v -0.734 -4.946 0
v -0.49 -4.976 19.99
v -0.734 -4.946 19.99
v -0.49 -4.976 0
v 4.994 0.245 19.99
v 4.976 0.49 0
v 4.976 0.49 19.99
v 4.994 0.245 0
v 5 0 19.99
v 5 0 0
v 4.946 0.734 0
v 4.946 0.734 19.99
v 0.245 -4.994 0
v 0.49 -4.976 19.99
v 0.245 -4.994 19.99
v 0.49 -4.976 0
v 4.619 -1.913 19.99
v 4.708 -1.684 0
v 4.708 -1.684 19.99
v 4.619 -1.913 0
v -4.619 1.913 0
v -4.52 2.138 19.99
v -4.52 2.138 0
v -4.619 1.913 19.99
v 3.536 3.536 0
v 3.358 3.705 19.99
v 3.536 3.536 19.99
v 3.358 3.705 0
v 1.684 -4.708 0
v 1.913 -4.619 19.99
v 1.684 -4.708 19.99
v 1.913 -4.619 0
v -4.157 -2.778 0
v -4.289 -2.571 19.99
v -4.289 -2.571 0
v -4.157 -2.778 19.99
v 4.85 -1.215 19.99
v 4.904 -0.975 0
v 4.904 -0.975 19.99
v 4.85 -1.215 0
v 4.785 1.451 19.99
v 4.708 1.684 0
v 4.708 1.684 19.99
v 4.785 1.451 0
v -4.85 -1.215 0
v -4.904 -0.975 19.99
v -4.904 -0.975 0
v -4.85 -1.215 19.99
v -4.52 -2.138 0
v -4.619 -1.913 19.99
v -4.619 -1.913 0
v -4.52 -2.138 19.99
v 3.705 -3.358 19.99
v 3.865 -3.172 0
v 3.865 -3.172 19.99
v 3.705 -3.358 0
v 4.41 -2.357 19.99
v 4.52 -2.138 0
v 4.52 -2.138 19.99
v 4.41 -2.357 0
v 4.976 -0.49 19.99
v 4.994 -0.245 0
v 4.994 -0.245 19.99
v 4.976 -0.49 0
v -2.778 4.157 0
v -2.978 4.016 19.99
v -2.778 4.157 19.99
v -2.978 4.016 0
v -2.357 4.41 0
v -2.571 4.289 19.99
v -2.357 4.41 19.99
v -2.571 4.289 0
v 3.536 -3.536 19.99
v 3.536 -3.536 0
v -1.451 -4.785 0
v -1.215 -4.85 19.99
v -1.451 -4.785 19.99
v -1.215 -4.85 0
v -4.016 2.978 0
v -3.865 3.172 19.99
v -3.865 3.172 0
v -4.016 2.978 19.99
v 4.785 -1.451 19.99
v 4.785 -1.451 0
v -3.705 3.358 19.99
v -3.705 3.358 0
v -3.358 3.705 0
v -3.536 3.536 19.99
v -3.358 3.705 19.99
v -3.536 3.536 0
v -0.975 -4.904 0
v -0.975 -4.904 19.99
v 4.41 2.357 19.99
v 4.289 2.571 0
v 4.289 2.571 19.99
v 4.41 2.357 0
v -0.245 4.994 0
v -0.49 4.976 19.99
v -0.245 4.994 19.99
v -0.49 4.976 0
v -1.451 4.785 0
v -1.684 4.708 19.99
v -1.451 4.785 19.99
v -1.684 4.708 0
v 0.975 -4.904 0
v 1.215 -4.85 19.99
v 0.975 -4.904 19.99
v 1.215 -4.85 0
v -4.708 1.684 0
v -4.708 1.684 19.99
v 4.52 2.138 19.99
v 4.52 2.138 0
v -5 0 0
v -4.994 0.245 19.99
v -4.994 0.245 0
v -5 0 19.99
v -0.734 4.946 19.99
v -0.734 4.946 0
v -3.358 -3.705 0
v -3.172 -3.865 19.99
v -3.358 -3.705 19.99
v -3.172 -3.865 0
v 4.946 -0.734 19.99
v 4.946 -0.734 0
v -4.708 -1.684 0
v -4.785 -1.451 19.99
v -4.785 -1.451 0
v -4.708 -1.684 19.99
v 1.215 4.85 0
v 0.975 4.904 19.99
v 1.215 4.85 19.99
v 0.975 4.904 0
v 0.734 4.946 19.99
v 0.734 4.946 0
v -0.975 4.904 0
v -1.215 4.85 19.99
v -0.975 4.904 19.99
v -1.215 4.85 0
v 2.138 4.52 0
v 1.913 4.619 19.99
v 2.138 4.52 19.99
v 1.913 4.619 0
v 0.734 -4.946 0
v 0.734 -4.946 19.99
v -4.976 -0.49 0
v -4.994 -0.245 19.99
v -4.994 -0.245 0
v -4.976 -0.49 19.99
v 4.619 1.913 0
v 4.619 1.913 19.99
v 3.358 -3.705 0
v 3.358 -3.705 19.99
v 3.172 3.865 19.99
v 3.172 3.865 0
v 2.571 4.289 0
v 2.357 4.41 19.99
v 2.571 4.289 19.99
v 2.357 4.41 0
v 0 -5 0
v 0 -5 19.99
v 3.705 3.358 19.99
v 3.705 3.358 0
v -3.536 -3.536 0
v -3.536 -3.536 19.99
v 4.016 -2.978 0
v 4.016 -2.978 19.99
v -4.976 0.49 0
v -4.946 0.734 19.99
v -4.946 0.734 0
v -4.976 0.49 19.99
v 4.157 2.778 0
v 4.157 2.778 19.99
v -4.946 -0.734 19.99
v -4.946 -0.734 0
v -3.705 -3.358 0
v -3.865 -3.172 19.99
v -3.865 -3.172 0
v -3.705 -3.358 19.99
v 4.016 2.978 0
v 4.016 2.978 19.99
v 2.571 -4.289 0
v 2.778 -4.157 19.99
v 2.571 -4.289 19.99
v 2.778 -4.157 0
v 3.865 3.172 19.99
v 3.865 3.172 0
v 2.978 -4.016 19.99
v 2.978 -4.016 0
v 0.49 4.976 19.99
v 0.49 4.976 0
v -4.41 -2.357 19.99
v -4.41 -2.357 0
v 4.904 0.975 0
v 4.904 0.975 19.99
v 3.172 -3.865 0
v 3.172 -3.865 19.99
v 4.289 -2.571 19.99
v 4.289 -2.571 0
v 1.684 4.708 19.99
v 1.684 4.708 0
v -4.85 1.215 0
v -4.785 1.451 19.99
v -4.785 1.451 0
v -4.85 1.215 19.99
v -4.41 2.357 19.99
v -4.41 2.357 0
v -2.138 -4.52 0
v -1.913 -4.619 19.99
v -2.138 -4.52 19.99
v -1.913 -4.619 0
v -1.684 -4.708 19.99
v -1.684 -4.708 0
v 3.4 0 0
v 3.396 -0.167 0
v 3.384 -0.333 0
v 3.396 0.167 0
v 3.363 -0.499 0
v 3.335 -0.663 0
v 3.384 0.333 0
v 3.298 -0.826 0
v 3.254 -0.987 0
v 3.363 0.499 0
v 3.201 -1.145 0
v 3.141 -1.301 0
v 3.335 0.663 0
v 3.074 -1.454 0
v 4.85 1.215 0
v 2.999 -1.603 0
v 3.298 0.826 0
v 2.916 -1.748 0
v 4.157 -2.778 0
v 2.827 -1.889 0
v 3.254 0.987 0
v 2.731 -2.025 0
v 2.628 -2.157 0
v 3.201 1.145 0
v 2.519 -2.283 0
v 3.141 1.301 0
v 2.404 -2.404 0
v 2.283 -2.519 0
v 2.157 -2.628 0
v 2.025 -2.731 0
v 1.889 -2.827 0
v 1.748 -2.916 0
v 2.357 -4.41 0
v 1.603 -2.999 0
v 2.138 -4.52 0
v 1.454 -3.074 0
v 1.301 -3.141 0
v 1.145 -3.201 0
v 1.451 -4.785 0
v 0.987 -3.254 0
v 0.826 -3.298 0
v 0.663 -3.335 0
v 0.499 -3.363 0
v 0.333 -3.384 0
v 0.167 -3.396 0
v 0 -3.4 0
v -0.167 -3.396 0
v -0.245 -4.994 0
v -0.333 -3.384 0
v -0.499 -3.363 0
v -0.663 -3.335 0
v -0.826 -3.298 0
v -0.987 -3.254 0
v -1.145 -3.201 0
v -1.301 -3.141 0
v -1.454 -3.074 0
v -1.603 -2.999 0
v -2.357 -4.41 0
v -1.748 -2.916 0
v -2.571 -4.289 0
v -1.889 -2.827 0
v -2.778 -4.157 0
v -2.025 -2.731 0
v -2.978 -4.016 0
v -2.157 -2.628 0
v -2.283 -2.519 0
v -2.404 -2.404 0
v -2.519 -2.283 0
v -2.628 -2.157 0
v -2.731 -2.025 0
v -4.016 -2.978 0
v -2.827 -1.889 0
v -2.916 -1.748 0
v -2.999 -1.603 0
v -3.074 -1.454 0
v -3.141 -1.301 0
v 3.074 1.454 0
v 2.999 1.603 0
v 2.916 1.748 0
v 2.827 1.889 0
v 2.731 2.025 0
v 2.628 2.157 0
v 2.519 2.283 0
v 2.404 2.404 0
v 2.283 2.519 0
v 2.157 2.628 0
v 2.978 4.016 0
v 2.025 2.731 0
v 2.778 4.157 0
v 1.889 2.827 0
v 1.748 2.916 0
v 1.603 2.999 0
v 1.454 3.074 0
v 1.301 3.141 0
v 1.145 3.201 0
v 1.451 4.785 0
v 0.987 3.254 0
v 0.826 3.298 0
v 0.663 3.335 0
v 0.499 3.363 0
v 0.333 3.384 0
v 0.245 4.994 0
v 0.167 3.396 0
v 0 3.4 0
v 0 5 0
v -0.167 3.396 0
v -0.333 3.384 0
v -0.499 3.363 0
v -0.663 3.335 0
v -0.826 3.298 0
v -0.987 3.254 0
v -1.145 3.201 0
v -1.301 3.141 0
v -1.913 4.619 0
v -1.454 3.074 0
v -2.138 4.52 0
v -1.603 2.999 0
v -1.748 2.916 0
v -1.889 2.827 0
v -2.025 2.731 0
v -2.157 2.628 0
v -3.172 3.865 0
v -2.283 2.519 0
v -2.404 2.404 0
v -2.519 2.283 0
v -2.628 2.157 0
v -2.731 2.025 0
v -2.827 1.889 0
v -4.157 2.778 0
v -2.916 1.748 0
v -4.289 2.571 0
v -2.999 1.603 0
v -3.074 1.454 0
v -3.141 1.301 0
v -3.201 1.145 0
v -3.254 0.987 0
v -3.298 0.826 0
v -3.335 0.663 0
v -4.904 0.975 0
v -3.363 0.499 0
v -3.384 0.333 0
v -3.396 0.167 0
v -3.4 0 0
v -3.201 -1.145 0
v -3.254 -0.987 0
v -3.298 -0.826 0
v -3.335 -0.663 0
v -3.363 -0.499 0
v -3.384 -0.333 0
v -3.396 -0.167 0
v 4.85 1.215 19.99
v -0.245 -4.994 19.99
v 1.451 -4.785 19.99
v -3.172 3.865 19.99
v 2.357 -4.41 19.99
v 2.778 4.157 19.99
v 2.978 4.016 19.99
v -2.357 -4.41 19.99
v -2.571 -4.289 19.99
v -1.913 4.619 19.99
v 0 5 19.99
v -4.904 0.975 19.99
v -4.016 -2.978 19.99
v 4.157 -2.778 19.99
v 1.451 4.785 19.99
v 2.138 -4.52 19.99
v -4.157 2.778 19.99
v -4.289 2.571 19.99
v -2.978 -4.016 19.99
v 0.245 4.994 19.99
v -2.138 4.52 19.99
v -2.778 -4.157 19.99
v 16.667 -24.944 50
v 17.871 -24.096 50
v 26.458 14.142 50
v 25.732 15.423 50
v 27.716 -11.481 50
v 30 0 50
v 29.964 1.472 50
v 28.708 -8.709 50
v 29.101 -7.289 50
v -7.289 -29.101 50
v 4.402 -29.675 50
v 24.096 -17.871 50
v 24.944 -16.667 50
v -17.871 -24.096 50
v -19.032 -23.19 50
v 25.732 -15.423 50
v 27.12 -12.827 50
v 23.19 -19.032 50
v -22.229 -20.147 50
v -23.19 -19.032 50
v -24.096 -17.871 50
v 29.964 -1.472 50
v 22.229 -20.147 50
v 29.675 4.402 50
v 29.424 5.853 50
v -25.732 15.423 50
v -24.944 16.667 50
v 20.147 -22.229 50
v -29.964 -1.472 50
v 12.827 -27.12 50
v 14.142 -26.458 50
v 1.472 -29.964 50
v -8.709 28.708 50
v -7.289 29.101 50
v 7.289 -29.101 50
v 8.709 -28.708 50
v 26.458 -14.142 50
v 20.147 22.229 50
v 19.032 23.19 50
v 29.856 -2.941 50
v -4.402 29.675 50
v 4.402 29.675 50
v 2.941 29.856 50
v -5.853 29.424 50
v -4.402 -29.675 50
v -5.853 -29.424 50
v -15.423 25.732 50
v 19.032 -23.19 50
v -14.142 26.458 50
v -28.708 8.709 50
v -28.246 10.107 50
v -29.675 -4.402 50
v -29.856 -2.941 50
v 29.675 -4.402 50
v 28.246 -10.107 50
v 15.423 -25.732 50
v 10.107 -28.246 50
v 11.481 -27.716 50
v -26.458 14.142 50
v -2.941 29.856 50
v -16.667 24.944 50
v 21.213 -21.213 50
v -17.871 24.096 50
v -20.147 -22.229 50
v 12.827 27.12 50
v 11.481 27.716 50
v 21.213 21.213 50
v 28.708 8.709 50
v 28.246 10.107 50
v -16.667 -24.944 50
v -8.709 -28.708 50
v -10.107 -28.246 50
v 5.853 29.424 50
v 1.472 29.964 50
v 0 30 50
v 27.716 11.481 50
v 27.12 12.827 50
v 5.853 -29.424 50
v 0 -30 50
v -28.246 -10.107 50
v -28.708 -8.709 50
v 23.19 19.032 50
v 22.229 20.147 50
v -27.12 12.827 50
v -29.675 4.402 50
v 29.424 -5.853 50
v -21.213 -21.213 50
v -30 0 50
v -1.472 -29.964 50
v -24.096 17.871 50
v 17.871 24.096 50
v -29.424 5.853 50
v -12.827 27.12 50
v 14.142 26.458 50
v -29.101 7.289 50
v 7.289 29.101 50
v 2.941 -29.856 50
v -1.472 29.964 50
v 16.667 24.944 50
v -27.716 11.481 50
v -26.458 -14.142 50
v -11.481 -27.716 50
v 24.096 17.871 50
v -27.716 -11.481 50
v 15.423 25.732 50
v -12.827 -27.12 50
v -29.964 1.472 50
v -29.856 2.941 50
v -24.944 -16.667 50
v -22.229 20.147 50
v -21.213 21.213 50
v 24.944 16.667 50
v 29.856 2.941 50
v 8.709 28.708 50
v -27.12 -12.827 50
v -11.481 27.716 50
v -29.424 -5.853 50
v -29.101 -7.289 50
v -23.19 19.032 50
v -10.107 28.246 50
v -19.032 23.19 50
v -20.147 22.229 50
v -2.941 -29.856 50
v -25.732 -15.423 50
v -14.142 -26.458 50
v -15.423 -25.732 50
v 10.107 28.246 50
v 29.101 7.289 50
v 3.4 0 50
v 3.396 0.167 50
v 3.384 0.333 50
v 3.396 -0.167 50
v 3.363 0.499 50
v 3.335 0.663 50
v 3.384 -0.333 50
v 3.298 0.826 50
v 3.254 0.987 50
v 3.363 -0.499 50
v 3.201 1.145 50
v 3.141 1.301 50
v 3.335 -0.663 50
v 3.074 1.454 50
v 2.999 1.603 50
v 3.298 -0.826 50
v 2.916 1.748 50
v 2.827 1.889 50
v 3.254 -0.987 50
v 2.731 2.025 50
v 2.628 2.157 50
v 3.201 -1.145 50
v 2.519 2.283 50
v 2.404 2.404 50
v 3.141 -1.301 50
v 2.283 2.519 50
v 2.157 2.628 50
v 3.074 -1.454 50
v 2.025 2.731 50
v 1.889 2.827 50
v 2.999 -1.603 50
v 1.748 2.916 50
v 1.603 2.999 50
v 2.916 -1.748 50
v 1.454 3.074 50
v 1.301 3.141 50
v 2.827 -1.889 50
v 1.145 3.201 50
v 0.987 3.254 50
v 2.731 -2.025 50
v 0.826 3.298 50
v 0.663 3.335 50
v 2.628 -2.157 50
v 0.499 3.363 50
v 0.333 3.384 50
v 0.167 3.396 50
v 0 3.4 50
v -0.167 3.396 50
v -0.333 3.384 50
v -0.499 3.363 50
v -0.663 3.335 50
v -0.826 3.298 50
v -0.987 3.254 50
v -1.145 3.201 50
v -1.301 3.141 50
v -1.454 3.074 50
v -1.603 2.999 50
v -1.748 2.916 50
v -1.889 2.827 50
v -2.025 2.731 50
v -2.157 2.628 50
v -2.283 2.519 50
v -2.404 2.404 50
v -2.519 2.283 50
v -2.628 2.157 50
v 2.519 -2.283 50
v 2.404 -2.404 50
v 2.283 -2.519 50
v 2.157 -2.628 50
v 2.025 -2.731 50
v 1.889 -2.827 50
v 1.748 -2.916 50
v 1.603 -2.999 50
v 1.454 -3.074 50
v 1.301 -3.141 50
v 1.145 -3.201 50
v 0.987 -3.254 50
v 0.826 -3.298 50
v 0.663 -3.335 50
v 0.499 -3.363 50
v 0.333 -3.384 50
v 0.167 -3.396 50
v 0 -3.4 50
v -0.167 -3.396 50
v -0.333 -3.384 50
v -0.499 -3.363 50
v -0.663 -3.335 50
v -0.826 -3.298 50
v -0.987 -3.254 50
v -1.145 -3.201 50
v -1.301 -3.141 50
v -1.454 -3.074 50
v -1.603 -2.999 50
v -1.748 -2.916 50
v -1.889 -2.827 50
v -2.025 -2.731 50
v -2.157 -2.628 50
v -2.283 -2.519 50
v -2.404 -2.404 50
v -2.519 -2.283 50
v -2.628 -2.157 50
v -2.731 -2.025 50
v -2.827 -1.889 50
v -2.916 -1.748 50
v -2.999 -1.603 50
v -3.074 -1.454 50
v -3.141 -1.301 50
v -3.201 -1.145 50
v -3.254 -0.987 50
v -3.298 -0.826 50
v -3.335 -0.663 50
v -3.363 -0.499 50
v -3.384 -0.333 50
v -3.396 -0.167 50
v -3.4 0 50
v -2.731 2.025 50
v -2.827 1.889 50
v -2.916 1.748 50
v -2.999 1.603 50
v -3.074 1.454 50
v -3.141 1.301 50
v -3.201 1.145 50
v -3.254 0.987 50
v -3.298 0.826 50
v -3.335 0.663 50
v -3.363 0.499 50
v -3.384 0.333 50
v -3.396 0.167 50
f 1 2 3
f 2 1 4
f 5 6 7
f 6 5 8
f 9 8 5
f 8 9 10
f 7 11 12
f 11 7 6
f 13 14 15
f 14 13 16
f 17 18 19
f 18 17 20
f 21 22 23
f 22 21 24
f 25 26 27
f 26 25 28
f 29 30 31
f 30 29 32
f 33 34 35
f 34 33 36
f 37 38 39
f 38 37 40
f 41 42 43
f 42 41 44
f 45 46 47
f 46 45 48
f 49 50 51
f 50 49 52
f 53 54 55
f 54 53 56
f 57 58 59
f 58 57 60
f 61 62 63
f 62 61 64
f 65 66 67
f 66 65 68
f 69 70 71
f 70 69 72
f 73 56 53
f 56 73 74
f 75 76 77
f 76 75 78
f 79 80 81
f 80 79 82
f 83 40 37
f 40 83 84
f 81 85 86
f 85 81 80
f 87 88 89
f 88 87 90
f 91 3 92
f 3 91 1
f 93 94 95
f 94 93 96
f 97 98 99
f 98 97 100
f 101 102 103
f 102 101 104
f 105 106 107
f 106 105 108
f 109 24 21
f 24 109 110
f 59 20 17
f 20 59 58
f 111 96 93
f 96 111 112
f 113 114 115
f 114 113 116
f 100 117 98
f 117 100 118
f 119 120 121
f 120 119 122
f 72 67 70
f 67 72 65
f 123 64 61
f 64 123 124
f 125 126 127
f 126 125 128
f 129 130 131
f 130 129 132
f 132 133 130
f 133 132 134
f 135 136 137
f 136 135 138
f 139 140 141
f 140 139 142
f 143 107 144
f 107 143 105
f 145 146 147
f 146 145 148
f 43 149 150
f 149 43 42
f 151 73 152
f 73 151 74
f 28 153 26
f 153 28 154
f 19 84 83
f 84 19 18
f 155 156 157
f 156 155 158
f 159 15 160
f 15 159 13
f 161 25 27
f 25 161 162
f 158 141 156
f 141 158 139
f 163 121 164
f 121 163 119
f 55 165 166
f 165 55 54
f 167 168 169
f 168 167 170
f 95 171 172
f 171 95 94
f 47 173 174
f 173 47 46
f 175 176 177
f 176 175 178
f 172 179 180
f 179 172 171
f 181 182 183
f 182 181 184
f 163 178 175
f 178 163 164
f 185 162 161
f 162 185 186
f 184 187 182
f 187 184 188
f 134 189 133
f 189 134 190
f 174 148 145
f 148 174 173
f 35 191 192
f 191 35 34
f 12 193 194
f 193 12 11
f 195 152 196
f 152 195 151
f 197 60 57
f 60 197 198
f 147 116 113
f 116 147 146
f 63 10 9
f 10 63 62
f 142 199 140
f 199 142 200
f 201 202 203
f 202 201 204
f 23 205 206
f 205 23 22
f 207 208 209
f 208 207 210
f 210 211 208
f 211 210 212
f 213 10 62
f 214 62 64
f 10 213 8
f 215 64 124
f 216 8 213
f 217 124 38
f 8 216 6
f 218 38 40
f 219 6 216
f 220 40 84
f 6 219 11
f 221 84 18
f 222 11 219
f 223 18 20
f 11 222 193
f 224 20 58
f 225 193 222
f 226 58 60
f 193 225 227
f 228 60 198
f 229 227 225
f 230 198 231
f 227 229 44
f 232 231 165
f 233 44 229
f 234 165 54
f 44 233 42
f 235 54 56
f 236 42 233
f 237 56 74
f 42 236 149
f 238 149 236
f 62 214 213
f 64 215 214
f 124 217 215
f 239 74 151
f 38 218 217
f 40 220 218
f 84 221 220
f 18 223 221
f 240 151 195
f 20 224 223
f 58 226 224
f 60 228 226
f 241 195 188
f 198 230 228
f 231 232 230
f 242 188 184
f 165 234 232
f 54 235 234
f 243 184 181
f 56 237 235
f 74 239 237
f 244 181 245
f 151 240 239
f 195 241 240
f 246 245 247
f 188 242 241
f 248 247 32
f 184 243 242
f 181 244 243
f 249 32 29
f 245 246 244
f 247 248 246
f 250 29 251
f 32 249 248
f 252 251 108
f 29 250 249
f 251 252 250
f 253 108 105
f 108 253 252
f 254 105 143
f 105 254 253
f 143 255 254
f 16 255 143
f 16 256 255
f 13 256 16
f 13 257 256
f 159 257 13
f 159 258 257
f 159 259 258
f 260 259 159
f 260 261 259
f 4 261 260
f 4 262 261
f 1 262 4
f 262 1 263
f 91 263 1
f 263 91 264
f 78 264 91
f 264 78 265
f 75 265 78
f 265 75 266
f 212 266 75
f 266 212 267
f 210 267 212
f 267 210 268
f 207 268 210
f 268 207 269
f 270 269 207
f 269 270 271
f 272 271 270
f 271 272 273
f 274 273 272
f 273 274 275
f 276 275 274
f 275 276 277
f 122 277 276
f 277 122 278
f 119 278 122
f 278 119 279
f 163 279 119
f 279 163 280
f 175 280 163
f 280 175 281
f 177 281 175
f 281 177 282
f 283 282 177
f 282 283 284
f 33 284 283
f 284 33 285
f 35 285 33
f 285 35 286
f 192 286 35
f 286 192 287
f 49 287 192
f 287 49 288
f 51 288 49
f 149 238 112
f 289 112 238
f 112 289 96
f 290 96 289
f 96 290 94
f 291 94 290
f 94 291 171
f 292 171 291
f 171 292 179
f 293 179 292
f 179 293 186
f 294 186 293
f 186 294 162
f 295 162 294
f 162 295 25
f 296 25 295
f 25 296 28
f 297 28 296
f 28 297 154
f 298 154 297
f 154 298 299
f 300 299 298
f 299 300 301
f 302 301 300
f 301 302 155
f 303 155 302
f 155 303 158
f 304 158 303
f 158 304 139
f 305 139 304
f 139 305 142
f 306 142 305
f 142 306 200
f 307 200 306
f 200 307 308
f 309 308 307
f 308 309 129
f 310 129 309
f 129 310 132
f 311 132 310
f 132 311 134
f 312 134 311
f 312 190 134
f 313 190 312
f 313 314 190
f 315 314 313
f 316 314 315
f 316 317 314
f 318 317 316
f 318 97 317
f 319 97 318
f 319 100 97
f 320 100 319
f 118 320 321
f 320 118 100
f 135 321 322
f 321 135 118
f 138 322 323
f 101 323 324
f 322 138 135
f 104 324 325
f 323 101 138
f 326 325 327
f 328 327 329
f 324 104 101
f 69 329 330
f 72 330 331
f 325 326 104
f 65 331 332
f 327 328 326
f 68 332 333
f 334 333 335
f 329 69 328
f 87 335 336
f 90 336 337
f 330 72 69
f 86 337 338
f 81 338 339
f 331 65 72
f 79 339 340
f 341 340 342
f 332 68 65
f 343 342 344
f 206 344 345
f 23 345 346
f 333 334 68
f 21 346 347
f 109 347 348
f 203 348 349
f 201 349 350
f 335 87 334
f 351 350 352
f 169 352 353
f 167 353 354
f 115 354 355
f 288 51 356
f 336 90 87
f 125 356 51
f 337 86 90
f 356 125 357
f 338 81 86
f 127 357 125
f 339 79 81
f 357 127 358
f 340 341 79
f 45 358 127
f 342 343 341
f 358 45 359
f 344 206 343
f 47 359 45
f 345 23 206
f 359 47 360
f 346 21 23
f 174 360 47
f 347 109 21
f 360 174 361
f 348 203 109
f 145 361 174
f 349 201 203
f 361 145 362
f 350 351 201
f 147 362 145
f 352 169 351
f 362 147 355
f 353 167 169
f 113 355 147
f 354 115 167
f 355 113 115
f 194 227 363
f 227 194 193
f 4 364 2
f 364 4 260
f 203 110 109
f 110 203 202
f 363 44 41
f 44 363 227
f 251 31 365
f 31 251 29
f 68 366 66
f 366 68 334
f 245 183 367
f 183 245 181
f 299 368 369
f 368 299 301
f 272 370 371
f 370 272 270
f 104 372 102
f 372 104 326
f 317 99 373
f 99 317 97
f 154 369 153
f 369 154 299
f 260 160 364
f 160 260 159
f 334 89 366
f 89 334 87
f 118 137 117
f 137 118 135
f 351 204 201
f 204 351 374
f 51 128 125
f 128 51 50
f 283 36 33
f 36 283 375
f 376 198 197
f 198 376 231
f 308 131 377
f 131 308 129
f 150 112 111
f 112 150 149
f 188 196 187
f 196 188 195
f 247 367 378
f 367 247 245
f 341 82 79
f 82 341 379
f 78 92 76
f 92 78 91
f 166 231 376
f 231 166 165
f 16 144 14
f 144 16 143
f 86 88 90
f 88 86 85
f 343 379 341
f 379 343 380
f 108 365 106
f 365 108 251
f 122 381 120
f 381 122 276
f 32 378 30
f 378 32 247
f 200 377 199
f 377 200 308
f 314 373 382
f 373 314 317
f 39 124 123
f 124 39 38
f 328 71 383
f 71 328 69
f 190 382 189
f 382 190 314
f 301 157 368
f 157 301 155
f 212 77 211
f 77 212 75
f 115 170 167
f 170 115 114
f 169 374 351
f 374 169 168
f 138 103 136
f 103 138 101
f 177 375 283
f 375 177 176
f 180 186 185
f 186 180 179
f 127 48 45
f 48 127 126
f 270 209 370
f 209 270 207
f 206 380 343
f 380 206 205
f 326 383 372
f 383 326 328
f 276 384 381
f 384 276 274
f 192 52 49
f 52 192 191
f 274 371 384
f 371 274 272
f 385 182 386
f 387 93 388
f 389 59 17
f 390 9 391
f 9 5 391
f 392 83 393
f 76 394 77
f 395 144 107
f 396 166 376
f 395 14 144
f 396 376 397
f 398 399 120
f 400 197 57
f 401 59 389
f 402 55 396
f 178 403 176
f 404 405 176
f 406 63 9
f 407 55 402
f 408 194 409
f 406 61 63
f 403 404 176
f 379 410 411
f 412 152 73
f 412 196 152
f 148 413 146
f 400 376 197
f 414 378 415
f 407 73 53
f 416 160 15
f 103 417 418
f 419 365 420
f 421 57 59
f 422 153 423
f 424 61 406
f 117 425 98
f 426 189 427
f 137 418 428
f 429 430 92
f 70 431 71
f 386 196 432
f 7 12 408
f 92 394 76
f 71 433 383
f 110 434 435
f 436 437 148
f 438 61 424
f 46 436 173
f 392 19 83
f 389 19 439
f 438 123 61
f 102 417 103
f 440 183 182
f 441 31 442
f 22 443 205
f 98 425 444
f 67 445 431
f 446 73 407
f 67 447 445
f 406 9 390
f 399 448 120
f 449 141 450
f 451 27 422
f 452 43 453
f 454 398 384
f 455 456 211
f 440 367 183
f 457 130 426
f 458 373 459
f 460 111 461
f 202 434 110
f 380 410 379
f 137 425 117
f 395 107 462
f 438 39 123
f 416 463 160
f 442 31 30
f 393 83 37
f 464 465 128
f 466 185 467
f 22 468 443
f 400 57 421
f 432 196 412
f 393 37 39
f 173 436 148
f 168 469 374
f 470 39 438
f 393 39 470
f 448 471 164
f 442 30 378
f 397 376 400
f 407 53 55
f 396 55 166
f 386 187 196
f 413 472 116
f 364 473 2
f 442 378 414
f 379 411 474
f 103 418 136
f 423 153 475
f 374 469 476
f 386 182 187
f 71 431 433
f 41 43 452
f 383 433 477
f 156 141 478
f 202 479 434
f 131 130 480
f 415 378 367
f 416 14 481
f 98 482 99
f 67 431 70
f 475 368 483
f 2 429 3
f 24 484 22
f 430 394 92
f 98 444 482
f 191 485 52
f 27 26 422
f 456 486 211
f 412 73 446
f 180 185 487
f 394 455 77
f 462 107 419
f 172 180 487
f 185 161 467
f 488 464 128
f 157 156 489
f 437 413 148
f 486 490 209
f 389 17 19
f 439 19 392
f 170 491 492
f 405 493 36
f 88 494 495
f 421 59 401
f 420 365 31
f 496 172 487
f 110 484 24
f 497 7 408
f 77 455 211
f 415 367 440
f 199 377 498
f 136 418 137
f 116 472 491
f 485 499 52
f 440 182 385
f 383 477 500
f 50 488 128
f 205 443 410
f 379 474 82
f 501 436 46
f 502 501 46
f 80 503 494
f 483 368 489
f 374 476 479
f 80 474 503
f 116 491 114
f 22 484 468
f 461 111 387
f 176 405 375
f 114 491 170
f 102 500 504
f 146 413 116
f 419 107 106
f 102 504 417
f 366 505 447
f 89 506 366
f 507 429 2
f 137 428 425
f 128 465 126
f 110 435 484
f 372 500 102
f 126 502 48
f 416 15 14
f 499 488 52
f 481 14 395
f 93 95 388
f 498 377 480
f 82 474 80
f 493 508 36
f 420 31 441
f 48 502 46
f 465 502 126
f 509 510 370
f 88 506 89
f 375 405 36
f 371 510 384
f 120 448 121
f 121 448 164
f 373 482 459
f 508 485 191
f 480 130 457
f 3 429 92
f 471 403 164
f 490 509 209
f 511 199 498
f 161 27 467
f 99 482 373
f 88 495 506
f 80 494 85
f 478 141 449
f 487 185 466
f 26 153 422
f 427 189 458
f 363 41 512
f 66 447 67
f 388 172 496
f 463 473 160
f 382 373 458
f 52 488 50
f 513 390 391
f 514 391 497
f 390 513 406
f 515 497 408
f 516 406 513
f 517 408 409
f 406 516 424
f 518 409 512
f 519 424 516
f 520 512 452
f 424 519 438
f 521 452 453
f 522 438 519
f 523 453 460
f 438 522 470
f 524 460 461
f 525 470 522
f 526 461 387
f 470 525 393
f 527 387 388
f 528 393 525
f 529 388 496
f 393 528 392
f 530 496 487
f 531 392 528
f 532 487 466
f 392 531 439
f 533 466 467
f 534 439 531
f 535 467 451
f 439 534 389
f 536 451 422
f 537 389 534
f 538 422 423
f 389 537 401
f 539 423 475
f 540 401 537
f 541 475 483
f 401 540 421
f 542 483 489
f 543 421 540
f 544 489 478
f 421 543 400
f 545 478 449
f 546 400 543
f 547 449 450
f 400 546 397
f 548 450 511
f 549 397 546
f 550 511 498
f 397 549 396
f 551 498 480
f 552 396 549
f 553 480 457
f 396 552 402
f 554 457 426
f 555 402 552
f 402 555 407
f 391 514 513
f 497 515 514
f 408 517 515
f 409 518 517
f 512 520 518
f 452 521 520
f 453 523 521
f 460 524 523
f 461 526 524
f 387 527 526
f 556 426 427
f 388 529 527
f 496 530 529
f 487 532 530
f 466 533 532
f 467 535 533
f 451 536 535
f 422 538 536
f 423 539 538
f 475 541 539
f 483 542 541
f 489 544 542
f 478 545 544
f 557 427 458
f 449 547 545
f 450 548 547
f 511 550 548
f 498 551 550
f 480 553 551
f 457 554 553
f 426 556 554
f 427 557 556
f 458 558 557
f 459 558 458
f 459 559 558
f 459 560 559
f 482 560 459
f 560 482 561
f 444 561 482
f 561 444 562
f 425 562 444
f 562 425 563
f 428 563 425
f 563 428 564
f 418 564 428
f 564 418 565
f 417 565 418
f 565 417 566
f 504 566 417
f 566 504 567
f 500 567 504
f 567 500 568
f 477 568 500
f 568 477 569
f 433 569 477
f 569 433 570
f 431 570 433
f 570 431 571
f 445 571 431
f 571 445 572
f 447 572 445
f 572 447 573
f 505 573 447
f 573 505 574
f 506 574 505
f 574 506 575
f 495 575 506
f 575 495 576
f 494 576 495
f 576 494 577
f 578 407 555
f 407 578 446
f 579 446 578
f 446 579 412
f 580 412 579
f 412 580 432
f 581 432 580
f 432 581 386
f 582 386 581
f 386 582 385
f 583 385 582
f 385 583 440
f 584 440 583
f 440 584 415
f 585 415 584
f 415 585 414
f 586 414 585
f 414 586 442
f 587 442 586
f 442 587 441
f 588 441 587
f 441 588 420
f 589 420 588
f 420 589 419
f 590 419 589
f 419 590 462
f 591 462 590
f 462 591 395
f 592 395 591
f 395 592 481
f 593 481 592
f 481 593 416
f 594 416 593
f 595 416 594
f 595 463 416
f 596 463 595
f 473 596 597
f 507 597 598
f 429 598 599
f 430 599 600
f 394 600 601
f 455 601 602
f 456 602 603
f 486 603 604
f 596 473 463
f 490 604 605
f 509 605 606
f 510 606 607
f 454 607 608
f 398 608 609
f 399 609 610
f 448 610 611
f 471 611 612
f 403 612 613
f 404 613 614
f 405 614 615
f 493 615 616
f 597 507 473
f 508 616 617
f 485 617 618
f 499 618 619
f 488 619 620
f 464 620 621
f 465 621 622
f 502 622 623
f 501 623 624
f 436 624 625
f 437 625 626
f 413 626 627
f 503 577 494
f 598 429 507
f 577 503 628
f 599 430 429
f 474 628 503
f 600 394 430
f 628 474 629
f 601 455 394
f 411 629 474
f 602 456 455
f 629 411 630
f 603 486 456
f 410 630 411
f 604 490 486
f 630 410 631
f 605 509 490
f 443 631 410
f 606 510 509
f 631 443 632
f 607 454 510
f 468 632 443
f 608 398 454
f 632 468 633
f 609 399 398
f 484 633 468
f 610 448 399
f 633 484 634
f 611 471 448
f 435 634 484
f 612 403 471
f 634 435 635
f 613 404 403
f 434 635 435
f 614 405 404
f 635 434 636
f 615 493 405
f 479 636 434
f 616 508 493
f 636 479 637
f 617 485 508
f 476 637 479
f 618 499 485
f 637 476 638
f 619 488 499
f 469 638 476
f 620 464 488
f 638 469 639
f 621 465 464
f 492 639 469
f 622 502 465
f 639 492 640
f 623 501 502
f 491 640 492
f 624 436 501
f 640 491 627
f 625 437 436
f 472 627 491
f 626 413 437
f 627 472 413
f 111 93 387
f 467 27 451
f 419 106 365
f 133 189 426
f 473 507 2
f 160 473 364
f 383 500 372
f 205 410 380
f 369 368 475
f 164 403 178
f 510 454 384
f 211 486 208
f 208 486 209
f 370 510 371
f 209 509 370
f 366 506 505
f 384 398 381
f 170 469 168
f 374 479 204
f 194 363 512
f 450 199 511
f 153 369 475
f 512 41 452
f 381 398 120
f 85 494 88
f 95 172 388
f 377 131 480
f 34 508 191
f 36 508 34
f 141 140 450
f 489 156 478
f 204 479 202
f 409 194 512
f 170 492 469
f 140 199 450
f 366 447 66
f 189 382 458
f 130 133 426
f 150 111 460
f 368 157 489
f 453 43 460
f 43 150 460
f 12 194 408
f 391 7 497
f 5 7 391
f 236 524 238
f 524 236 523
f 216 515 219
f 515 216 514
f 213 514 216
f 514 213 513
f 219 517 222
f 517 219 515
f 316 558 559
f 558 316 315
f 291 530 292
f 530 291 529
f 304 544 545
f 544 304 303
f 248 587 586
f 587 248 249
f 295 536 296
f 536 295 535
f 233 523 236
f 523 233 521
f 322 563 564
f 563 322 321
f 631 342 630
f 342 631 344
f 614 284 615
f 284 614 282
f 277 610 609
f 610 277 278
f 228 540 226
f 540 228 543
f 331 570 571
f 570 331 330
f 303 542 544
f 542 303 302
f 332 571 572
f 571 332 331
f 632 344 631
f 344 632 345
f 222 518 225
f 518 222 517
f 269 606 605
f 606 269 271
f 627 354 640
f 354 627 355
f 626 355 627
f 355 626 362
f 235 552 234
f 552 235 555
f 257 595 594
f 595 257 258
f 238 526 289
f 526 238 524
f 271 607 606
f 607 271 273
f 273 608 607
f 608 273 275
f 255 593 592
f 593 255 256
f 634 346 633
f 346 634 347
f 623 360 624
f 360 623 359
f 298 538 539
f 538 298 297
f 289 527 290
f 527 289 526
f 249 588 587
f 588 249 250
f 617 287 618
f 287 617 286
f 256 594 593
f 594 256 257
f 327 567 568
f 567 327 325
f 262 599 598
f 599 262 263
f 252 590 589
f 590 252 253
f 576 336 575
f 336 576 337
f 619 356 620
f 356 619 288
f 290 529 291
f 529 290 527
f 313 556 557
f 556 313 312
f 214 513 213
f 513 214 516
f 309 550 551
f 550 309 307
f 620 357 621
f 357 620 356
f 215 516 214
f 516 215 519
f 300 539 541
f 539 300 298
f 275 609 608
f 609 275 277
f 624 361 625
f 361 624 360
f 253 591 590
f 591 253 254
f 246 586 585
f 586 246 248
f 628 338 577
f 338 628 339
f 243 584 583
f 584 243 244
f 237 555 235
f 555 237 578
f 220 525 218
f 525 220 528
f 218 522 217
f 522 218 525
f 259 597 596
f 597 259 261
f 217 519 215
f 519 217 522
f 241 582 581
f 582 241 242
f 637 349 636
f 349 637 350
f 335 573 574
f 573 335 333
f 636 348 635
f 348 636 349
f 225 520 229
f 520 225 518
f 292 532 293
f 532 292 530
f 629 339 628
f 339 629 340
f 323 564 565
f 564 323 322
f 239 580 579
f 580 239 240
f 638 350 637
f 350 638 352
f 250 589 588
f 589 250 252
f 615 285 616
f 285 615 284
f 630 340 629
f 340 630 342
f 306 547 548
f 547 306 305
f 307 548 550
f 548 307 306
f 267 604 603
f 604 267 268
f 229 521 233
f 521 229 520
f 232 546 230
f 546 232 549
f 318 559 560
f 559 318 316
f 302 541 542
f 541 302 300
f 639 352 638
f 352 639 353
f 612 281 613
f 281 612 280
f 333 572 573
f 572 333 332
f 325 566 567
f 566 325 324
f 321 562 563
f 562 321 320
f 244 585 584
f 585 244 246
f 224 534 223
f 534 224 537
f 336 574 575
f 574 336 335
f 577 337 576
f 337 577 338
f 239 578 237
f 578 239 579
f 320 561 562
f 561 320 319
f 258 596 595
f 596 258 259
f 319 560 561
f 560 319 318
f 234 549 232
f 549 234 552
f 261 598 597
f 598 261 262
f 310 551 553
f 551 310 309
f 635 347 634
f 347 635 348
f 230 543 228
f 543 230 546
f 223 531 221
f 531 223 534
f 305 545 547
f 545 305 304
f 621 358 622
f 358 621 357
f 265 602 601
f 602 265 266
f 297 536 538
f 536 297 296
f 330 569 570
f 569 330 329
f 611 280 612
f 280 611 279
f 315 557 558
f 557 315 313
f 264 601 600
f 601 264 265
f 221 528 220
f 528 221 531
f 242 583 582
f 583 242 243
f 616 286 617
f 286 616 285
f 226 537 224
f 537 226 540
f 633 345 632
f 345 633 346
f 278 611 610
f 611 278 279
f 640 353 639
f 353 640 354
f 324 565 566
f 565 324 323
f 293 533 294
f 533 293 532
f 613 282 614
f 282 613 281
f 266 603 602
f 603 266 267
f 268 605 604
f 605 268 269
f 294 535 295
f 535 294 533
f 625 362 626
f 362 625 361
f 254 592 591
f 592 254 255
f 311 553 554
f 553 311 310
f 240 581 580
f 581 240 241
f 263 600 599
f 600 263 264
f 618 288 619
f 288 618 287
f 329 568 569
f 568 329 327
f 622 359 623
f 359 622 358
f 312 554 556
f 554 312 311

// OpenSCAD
// Small lab funnel - printed upright, wide opening at the top
// All dimensions in mm

// ---- Parameters ----
spout_od      = 10;    // spout outer diameter
spout_h       = 20;    // spout height (z = 0 to 20)
cone_od_top   = 60;    // cone outer diameter at rim (z = 50)
cone_od_bot   = 10;    // cone outer diameter at base (z = 20)
wall          = 1.6;   // wall thickness everywhere
cut_extra     = 0.5;   // overshoot for clean boolean cuts
$fn           = 128;   // curve resolution

// ---- Derived ----
spout_id = spout_od - 2 * wall;   // 6.8 mm bore
cone_h   = 50 - 20;              // 30 mm cone height

// ---- Model ----
difference() {
    union() {
        // Spout
        cylinder(d = spout_od, h = spout_h);
        // Cone (slightly overlapping spout to fuse solids)
        translate([0, 0, spout_h - 0.01])
            cylinder(d1 = cone_od_bot, d2 = cone_od_top, h = cone_h + 0.01);
    }
    // Through-bore: spout bore extended above rim and below z = 0
    translate([0, 0, -1])
        cylinder(d = spout_id, h = spout_h + cone_h + 2);
}
